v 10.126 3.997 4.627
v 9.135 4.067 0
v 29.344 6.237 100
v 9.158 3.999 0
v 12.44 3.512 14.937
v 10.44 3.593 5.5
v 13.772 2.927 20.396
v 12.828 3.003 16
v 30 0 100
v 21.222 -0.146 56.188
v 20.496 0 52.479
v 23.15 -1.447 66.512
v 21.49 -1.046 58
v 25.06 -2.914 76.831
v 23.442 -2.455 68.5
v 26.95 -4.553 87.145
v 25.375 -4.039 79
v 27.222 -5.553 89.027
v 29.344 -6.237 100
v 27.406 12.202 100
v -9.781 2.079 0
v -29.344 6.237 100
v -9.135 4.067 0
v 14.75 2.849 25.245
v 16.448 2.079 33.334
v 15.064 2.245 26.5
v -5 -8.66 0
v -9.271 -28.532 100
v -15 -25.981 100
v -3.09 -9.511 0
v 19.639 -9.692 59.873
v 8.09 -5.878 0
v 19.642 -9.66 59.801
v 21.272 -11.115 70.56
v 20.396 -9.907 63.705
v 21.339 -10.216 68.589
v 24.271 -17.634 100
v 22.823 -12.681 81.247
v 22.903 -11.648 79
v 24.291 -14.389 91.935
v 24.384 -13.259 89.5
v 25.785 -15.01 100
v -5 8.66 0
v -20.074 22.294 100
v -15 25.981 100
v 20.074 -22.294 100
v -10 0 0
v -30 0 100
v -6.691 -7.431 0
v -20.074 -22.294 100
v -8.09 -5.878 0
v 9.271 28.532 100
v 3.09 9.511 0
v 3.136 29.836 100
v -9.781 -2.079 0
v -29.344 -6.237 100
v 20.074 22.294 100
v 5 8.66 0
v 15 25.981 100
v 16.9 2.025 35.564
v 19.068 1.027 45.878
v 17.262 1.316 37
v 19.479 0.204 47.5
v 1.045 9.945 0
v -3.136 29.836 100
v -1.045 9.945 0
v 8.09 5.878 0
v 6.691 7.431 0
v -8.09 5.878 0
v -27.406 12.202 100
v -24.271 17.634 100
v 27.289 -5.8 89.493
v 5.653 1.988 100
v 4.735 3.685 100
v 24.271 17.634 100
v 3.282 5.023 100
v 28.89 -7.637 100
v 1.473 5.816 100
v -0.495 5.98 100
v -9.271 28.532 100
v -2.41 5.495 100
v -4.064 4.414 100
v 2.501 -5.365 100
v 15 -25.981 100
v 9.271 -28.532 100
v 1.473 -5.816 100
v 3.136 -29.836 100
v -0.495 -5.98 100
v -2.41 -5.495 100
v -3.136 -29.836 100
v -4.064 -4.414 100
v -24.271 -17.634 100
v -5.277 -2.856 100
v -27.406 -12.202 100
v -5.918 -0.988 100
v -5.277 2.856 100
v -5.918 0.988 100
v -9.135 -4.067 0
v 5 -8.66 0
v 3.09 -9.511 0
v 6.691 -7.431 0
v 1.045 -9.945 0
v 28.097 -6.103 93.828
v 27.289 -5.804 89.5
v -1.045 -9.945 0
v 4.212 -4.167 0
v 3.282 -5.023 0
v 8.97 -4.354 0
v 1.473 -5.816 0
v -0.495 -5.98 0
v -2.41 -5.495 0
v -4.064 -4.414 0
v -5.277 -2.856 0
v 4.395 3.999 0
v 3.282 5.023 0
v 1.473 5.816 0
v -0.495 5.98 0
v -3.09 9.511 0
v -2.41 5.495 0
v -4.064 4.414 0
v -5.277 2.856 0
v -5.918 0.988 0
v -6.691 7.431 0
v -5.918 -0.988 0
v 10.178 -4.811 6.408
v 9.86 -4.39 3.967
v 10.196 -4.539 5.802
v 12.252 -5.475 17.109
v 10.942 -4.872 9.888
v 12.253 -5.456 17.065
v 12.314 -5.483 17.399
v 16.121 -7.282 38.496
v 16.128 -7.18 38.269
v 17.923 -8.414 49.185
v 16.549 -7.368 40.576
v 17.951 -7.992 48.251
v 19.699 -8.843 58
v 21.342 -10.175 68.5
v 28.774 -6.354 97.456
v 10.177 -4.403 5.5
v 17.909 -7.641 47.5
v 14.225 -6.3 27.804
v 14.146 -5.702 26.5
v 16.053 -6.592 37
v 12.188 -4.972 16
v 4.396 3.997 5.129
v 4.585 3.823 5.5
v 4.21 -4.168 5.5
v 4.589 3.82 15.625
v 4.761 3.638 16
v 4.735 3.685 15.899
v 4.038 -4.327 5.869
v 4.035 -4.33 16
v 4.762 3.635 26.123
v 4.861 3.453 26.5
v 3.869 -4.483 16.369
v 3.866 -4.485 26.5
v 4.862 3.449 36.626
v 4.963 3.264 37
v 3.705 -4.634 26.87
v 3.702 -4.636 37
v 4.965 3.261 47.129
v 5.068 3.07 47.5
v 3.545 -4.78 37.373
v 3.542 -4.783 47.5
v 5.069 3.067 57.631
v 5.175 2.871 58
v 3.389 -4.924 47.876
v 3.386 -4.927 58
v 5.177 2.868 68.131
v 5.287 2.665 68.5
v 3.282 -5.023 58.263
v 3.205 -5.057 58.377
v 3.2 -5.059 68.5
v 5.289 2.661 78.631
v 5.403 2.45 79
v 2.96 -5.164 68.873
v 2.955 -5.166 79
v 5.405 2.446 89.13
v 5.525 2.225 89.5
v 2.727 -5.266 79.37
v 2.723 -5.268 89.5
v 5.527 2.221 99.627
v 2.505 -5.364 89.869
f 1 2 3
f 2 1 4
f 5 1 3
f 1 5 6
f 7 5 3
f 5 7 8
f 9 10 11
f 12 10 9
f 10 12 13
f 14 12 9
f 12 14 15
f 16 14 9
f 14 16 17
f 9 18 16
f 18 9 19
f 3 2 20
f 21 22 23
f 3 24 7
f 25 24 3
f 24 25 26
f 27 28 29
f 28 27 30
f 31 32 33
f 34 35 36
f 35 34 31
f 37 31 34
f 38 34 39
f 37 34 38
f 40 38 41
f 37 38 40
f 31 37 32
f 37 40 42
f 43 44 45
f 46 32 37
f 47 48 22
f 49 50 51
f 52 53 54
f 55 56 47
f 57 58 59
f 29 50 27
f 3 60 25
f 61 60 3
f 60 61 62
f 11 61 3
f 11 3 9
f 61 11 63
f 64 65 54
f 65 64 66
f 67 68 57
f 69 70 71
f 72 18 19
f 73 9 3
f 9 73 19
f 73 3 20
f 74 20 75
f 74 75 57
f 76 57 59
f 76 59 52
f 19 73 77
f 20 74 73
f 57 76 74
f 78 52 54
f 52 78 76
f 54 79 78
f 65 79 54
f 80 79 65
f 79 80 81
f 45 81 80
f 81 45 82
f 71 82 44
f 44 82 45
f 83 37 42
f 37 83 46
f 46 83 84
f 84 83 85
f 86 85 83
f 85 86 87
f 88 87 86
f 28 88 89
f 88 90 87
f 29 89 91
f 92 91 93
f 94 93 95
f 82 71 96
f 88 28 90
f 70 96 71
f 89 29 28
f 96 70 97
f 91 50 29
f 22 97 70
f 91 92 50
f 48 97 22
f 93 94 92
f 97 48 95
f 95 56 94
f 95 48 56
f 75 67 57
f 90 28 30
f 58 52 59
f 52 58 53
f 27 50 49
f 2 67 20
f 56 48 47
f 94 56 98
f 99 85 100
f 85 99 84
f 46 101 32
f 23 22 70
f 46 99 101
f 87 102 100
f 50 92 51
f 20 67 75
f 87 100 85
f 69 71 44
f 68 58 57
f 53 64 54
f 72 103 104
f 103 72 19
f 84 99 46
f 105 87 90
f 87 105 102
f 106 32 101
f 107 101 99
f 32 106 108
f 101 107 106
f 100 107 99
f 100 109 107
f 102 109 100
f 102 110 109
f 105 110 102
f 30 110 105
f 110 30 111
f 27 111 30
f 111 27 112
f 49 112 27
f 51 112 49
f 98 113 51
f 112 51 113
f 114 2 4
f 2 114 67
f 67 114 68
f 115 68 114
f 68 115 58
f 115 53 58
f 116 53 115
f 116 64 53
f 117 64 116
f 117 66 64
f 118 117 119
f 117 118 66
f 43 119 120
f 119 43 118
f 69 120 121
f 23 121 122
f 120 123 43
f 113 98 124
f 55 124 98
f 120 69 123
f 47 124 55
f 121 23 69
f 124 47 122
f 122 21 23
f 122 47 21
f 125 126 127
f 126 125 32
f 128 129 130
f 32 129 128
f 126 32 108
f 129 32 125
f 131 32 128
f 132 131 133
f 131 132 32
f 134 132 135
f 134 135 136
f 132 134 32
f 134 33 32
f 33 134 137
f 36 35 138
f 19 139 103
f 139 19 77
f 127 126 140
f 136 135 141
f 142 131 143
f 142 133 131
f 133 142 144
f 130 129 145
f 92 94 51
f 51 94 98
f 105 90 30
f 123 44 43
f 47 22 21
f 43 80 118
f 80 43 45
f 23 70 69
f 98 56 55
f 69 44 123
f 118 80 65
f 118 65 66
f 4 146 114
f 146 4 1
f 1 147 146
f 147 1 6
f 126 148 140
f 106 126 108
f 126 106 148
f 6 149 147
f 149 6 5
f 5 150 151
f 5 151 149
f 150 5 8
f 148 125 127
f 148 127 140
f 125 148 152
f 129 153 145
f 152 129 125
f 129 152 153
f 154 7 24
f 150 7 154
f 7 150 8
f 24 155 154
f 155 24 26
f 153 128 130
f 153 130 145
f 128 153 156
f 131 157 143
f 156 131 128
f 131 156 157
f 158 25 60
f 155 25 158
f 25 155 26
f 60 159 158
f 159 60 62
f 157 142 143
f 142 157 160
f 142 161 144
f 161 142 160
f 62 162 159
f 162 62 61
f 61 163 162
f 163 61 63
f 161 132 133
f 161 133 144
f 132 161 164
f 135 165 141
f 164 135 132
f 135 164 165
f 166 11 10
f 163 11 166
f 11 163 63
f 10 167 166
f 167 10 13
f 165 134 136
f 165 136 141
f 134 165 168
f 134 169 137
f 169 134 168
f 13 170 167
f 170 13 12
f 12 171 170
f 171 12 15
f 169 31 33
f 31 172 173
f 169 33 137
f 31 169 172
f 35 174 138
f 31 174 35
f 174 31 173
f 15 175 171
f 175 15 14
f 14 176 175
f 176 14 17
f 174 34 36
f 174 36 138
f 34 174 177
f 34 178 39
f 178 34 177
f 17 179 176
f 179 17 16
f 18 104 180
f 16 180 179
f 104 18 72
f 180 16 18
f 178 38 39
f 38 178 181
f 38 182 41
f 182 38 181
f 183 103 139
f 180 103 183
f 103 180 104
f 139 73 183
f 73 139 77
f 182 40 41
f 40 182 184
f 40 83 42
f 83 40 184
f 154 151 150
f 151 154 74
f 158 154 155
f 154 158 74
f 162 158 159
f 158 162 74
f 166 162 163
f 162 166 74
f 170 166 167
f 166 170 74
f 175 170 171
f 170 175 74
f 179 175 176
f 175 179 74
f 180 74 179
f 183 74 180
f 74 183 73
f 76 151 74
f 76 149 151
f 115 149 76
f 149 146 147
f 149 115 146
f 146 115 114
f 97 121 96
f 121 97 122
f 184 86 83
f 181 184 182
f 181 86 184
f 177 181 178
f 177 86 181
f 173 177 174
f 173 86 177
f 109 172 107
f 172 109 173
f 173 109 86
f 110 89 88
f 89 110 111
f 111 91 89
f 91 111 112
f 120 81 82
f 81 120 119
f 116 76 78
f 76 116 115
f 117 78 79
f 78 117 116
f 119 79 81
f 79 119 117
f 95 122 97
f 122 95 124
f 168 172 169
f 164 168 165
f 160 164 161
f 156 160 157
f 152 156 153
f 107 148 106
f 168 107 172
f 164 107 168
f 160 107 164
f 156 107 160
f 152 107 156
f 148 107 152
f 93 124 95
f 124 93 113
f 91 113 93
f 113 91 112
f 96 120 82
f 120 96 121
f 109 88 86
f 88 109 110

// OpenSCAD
difference(){
    linear_extrude(100,scale=3,twist=0,convexity=0100){
difference(){
    circle(10);
  
}} 
translate( [0,0,-5])
linear_extrude(210,slices=20, twist=45,convexity=100){
square([120,4]);
mirror( [0,-1,0])square([120,4]);
}
translate( [0,0,-5])cylinder(300,6,6);
}
